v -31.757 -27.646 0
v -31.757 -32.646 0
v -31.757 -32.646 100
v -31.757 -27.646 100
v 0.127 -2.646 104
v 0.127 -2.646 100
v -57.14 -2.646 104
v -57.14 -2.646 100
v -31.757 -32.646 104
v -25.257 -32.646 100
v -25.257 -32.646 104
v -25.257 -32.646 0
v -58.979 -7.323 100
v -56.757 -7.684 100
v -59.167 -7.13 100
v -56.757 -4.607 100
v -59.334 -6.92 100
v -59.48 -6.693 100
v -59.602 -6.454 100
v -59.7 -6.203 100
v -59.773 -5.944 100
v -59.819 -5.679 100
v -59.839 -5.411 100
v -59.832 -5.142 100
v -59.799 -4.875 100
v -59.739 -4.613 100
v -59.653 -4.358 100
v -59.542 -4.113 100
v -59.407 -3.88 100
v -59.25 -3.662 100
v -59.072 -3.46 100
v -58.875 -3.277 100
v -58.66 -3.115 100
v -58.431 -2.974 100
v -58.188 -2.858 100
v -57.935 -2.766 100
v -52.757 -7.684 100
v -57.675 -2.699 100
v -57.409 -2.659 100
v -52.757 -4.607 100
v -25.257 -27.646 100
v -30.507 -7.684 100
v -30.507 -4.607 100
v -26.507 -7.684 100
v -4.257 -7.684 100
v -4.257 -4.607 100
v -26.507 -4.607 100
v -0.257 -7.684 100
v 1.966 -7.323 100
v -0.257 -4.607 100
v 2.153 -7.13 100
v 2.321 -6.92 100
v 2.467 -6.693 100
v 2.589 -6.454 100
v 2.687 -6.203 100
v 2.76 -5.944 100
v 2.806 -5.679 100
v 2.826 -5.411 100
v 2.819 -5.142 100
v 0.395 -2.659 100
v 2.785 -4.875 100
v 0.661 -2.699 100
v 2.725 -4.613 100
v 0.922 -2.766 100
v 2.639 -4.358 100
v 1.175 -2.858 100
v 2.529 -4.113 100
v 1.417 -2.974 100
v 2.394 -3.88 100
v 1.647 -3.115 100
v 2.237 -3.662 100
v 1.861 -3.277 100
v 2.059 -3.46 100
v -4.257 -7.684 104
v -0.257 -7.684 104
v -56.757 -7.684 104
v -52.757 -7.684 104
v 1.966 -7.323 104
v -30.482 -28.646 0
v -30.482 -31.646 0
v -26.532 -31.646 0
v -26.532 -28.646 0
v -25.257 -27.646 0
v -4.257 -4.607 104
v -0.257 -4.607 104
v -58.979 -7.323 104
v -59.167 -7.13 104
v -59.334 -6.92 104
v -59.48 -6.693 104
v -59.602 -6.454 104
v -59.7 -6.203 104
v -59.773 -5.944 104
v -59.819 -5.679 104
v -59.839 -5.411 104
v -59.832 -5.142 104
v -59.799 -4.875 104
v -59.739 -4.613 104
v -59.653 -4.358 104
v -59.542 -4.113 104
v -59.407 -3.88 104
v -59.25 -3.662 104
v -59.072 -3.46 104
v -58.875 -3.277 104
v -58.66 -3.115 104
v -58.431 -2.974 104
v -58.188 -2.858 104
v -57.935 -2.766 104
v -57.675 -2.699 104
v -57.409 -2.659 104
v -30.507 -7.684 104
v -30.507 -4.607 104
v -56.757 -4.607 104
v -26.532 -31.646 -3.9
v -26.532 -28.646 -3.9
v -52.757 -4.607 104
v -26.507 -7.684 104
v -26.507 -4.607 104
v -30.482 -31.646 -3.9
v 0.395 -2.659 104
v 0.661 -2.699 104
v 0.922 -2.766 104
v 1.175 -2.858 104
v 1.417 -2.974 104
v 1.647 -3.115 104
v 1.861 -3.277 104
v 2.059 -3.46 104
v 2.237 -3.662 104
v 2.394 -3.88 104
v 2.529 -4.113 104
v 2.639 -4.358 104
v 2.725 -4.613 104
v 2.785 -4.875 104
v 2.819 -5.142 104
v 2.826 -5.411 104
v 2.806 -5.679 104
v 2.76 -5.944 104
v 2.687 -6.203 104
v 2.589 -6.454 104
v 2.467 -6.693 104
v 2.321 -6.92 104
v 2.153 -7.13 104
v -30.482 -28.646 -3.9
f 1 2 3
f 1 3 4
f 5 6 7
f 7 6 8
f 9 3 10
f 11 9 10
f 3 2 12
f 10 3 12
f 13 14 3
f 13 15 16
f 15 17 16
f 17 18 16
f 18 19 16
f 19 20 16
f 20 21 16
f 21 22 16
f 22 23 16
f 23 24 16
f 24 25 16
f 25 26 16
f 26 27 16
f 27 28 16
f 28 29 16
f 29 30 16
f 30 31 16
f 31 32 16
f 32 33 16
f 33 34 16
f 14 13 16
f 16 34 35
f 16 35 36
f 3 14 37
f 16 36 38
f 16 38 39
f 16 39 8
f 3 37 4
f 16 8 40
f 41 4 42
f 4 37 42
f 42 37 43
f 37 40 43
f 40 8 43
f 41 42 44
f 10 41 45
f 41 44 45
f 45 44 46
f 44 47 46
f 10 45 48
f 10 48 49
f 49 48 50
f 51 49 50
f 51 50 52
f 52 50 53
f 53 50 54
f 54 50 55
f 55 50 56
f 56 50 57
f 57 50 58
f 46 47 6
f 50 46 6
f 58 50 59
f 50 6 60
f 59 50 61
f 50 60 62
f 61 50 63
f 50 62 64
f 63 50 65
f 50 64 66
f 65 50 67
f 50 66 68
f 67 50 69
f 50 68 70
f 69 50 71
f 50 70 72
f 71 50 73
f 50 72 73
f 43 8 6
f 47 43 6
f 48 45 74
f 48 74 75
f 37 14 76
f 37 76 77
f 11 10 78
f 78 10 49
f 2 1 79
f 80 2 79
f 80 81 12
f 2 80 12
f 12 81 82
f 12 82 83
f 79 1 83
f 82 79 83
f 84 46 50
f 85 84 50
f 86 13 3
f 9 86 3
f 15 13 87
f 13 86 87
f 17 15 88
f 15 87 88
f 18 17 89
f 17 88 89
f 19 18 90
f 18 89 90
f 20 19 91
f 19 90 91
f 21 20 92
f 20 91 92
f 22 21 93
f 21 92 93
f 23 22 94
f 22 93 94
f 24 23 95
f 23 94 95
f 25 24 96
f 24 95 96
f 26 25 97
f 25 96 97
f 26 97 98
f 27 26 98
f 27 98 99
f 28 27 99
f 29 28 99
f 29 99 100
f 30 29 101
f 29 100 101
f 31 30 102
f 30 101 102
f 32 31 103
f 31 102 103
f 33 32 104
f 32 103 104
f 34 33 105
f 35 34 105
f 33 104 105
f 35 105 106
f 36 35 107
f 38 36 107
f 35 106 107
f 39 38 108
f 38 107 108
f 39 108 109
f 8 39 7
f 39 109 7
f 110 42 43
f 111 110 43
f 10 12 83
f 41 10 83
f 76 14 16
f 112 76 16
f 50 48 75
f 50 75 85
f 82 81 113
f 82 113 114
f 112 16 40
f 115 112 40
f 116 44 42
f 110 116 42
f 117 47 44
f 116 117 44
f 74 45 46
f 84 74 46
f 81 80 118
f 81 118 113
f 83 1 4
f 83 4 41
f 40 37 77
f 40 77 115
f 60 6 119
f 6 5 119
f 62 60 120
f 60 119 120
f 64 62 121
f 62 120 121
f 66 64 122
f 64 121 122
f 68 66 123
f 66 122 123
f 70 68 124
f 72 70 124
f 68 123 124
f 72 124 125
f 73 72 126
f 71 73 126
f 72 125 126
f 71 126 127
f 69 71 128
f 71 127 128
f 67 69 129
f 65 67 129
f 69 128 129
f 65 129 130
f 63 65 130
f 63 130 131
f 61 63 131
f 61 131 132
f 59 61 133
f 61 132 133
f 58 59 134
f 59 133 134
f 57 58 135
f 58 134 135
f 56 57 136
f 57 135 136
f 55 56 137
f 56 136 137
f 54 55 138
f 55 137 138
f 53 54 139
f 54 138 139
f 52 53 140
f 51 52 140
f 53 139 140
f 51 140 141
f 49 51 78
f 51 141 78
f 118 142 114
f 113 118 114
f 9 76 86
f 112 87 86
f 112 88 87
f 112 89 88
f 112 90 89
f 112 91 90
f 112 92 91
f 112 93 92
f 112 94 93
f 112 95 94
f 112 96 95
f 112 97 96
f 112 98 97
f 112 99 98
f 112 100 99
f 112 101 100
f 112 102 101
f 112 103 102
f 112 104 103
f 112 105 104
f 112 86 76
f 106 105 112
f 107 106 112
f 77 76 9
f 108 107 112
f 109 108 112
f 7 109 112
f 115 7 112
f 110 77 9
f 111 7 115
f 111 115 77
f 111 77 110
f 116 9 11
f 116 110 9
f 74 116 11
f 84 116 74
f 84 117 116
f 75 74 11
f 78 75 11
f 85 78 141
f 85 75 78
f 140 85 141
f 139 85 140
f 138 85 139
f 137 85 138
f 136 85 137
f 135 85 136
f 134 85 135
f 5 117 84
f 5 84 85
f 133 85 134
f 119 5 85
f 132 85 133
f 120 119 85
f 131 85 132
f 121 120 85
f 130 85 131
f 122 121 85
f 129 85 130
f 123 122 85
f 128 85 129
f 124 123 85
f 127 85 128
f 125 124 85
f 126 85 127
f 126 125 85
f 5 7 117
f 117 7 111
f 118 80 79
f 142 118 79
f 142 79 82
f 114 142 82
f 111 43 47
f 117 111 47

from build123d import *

# Parameters (mm, degrees)
F0_W     = 3.95
F0_H     = 3
F1_DEPTH = 3.9
F0_W_2   = 6.5
F0_H_2   = 5
F2_DEPTH = 100
F3_W     = 4
F3_H     = 3.077
F3_W_2   = 3.25
F3_H_2   = 5
F4_DEPTH = 4
F5_R     = 2.7


with BuildPart() as f1:
    # F0 (on Top) → F1 (new body)
    with BuildSketch(Plane.XY):
        with Locations((-28.5066142678, -30.1459487528)):
            Rectangle(F0_W, F0_H)
    extrude(amount=-F1_DEPTH)

    # F0 (on Top) → F2 (join)
    with BuildSketch(Plane.XY):
        with Locations((-28.5066142678, -30.1459487528)):
            Rectangle(F0_W_2, F0_H_2)
        with Locations((-28.5066142678, -30.1459487528)):
            Rectangle(F0_W, F0_H, mode=Mode.SUBTRACT)
        with Locations((-28.5066142678, -30.1459487528)):
            Rectangle(F0_W, F0_H)
    extrude(amount=F2_DEPTH)

    # F3 (on face) → F4 (join)
    with BuildSketch(Plane.XY.offset(100)):
        Polygon((-64.0066142678, -2.6459487528), (-31.7566142678, -32.6459487528), (-31.7566142678, -27.6459487528), (-28.5066142678, -27.6459487528), (-28.5066142678, -7.6844487528), (-30.5066142678, -7.6844487528), (-30.5066142678, -4.6074487528), (-28.5066142678, -4.6074487528), (-28.5066142678, -2.6459487528), align=None)
        with Locations((-54.7566142678, -6.1459487528)):
            Rectangle(F3_W, F3_H, mode=Mode.SUBTRACT)
        Polygon((6.9933857322, -2.6459487528), (-28.5066142678, -2.6459487528), (-28.5066142678, -4.6074487528), (-26.5066142678, -4.6074487528), (-26.5066142678, -7.6844487528), (-28.5066142678, -7.6844487528), (-28.5066142678, -27.6459487528), (-25.2566142678, -27.6459487528), (-25.2566142678, -32.6459487528), align=None)
        with Locations((-2.2566142678, -6.1459487528)):
            Rectangle(F3_W, F3_H, mode=Mode.SUBTRACT)
        with Locations((-26.8816142678, -30.1459487528)):
            Rectangle(F3_W_2, F3_H_2)
        with Locations((-30.1316142678, -30.1459487528)):
            Rectangle(F3_W_2, F3_H_2)
    extrude(amount=F4_DEPTH)

    # F5
    f5_edges = [f1.edges().sort_by_distance(p)[0] for p in [
        (-64.006614, -2.645949, 102),
        (6.993386, -2.645949, 102),
    ]]
    fillet(f5_edges, radius=F5_R)


solid = f1.part
